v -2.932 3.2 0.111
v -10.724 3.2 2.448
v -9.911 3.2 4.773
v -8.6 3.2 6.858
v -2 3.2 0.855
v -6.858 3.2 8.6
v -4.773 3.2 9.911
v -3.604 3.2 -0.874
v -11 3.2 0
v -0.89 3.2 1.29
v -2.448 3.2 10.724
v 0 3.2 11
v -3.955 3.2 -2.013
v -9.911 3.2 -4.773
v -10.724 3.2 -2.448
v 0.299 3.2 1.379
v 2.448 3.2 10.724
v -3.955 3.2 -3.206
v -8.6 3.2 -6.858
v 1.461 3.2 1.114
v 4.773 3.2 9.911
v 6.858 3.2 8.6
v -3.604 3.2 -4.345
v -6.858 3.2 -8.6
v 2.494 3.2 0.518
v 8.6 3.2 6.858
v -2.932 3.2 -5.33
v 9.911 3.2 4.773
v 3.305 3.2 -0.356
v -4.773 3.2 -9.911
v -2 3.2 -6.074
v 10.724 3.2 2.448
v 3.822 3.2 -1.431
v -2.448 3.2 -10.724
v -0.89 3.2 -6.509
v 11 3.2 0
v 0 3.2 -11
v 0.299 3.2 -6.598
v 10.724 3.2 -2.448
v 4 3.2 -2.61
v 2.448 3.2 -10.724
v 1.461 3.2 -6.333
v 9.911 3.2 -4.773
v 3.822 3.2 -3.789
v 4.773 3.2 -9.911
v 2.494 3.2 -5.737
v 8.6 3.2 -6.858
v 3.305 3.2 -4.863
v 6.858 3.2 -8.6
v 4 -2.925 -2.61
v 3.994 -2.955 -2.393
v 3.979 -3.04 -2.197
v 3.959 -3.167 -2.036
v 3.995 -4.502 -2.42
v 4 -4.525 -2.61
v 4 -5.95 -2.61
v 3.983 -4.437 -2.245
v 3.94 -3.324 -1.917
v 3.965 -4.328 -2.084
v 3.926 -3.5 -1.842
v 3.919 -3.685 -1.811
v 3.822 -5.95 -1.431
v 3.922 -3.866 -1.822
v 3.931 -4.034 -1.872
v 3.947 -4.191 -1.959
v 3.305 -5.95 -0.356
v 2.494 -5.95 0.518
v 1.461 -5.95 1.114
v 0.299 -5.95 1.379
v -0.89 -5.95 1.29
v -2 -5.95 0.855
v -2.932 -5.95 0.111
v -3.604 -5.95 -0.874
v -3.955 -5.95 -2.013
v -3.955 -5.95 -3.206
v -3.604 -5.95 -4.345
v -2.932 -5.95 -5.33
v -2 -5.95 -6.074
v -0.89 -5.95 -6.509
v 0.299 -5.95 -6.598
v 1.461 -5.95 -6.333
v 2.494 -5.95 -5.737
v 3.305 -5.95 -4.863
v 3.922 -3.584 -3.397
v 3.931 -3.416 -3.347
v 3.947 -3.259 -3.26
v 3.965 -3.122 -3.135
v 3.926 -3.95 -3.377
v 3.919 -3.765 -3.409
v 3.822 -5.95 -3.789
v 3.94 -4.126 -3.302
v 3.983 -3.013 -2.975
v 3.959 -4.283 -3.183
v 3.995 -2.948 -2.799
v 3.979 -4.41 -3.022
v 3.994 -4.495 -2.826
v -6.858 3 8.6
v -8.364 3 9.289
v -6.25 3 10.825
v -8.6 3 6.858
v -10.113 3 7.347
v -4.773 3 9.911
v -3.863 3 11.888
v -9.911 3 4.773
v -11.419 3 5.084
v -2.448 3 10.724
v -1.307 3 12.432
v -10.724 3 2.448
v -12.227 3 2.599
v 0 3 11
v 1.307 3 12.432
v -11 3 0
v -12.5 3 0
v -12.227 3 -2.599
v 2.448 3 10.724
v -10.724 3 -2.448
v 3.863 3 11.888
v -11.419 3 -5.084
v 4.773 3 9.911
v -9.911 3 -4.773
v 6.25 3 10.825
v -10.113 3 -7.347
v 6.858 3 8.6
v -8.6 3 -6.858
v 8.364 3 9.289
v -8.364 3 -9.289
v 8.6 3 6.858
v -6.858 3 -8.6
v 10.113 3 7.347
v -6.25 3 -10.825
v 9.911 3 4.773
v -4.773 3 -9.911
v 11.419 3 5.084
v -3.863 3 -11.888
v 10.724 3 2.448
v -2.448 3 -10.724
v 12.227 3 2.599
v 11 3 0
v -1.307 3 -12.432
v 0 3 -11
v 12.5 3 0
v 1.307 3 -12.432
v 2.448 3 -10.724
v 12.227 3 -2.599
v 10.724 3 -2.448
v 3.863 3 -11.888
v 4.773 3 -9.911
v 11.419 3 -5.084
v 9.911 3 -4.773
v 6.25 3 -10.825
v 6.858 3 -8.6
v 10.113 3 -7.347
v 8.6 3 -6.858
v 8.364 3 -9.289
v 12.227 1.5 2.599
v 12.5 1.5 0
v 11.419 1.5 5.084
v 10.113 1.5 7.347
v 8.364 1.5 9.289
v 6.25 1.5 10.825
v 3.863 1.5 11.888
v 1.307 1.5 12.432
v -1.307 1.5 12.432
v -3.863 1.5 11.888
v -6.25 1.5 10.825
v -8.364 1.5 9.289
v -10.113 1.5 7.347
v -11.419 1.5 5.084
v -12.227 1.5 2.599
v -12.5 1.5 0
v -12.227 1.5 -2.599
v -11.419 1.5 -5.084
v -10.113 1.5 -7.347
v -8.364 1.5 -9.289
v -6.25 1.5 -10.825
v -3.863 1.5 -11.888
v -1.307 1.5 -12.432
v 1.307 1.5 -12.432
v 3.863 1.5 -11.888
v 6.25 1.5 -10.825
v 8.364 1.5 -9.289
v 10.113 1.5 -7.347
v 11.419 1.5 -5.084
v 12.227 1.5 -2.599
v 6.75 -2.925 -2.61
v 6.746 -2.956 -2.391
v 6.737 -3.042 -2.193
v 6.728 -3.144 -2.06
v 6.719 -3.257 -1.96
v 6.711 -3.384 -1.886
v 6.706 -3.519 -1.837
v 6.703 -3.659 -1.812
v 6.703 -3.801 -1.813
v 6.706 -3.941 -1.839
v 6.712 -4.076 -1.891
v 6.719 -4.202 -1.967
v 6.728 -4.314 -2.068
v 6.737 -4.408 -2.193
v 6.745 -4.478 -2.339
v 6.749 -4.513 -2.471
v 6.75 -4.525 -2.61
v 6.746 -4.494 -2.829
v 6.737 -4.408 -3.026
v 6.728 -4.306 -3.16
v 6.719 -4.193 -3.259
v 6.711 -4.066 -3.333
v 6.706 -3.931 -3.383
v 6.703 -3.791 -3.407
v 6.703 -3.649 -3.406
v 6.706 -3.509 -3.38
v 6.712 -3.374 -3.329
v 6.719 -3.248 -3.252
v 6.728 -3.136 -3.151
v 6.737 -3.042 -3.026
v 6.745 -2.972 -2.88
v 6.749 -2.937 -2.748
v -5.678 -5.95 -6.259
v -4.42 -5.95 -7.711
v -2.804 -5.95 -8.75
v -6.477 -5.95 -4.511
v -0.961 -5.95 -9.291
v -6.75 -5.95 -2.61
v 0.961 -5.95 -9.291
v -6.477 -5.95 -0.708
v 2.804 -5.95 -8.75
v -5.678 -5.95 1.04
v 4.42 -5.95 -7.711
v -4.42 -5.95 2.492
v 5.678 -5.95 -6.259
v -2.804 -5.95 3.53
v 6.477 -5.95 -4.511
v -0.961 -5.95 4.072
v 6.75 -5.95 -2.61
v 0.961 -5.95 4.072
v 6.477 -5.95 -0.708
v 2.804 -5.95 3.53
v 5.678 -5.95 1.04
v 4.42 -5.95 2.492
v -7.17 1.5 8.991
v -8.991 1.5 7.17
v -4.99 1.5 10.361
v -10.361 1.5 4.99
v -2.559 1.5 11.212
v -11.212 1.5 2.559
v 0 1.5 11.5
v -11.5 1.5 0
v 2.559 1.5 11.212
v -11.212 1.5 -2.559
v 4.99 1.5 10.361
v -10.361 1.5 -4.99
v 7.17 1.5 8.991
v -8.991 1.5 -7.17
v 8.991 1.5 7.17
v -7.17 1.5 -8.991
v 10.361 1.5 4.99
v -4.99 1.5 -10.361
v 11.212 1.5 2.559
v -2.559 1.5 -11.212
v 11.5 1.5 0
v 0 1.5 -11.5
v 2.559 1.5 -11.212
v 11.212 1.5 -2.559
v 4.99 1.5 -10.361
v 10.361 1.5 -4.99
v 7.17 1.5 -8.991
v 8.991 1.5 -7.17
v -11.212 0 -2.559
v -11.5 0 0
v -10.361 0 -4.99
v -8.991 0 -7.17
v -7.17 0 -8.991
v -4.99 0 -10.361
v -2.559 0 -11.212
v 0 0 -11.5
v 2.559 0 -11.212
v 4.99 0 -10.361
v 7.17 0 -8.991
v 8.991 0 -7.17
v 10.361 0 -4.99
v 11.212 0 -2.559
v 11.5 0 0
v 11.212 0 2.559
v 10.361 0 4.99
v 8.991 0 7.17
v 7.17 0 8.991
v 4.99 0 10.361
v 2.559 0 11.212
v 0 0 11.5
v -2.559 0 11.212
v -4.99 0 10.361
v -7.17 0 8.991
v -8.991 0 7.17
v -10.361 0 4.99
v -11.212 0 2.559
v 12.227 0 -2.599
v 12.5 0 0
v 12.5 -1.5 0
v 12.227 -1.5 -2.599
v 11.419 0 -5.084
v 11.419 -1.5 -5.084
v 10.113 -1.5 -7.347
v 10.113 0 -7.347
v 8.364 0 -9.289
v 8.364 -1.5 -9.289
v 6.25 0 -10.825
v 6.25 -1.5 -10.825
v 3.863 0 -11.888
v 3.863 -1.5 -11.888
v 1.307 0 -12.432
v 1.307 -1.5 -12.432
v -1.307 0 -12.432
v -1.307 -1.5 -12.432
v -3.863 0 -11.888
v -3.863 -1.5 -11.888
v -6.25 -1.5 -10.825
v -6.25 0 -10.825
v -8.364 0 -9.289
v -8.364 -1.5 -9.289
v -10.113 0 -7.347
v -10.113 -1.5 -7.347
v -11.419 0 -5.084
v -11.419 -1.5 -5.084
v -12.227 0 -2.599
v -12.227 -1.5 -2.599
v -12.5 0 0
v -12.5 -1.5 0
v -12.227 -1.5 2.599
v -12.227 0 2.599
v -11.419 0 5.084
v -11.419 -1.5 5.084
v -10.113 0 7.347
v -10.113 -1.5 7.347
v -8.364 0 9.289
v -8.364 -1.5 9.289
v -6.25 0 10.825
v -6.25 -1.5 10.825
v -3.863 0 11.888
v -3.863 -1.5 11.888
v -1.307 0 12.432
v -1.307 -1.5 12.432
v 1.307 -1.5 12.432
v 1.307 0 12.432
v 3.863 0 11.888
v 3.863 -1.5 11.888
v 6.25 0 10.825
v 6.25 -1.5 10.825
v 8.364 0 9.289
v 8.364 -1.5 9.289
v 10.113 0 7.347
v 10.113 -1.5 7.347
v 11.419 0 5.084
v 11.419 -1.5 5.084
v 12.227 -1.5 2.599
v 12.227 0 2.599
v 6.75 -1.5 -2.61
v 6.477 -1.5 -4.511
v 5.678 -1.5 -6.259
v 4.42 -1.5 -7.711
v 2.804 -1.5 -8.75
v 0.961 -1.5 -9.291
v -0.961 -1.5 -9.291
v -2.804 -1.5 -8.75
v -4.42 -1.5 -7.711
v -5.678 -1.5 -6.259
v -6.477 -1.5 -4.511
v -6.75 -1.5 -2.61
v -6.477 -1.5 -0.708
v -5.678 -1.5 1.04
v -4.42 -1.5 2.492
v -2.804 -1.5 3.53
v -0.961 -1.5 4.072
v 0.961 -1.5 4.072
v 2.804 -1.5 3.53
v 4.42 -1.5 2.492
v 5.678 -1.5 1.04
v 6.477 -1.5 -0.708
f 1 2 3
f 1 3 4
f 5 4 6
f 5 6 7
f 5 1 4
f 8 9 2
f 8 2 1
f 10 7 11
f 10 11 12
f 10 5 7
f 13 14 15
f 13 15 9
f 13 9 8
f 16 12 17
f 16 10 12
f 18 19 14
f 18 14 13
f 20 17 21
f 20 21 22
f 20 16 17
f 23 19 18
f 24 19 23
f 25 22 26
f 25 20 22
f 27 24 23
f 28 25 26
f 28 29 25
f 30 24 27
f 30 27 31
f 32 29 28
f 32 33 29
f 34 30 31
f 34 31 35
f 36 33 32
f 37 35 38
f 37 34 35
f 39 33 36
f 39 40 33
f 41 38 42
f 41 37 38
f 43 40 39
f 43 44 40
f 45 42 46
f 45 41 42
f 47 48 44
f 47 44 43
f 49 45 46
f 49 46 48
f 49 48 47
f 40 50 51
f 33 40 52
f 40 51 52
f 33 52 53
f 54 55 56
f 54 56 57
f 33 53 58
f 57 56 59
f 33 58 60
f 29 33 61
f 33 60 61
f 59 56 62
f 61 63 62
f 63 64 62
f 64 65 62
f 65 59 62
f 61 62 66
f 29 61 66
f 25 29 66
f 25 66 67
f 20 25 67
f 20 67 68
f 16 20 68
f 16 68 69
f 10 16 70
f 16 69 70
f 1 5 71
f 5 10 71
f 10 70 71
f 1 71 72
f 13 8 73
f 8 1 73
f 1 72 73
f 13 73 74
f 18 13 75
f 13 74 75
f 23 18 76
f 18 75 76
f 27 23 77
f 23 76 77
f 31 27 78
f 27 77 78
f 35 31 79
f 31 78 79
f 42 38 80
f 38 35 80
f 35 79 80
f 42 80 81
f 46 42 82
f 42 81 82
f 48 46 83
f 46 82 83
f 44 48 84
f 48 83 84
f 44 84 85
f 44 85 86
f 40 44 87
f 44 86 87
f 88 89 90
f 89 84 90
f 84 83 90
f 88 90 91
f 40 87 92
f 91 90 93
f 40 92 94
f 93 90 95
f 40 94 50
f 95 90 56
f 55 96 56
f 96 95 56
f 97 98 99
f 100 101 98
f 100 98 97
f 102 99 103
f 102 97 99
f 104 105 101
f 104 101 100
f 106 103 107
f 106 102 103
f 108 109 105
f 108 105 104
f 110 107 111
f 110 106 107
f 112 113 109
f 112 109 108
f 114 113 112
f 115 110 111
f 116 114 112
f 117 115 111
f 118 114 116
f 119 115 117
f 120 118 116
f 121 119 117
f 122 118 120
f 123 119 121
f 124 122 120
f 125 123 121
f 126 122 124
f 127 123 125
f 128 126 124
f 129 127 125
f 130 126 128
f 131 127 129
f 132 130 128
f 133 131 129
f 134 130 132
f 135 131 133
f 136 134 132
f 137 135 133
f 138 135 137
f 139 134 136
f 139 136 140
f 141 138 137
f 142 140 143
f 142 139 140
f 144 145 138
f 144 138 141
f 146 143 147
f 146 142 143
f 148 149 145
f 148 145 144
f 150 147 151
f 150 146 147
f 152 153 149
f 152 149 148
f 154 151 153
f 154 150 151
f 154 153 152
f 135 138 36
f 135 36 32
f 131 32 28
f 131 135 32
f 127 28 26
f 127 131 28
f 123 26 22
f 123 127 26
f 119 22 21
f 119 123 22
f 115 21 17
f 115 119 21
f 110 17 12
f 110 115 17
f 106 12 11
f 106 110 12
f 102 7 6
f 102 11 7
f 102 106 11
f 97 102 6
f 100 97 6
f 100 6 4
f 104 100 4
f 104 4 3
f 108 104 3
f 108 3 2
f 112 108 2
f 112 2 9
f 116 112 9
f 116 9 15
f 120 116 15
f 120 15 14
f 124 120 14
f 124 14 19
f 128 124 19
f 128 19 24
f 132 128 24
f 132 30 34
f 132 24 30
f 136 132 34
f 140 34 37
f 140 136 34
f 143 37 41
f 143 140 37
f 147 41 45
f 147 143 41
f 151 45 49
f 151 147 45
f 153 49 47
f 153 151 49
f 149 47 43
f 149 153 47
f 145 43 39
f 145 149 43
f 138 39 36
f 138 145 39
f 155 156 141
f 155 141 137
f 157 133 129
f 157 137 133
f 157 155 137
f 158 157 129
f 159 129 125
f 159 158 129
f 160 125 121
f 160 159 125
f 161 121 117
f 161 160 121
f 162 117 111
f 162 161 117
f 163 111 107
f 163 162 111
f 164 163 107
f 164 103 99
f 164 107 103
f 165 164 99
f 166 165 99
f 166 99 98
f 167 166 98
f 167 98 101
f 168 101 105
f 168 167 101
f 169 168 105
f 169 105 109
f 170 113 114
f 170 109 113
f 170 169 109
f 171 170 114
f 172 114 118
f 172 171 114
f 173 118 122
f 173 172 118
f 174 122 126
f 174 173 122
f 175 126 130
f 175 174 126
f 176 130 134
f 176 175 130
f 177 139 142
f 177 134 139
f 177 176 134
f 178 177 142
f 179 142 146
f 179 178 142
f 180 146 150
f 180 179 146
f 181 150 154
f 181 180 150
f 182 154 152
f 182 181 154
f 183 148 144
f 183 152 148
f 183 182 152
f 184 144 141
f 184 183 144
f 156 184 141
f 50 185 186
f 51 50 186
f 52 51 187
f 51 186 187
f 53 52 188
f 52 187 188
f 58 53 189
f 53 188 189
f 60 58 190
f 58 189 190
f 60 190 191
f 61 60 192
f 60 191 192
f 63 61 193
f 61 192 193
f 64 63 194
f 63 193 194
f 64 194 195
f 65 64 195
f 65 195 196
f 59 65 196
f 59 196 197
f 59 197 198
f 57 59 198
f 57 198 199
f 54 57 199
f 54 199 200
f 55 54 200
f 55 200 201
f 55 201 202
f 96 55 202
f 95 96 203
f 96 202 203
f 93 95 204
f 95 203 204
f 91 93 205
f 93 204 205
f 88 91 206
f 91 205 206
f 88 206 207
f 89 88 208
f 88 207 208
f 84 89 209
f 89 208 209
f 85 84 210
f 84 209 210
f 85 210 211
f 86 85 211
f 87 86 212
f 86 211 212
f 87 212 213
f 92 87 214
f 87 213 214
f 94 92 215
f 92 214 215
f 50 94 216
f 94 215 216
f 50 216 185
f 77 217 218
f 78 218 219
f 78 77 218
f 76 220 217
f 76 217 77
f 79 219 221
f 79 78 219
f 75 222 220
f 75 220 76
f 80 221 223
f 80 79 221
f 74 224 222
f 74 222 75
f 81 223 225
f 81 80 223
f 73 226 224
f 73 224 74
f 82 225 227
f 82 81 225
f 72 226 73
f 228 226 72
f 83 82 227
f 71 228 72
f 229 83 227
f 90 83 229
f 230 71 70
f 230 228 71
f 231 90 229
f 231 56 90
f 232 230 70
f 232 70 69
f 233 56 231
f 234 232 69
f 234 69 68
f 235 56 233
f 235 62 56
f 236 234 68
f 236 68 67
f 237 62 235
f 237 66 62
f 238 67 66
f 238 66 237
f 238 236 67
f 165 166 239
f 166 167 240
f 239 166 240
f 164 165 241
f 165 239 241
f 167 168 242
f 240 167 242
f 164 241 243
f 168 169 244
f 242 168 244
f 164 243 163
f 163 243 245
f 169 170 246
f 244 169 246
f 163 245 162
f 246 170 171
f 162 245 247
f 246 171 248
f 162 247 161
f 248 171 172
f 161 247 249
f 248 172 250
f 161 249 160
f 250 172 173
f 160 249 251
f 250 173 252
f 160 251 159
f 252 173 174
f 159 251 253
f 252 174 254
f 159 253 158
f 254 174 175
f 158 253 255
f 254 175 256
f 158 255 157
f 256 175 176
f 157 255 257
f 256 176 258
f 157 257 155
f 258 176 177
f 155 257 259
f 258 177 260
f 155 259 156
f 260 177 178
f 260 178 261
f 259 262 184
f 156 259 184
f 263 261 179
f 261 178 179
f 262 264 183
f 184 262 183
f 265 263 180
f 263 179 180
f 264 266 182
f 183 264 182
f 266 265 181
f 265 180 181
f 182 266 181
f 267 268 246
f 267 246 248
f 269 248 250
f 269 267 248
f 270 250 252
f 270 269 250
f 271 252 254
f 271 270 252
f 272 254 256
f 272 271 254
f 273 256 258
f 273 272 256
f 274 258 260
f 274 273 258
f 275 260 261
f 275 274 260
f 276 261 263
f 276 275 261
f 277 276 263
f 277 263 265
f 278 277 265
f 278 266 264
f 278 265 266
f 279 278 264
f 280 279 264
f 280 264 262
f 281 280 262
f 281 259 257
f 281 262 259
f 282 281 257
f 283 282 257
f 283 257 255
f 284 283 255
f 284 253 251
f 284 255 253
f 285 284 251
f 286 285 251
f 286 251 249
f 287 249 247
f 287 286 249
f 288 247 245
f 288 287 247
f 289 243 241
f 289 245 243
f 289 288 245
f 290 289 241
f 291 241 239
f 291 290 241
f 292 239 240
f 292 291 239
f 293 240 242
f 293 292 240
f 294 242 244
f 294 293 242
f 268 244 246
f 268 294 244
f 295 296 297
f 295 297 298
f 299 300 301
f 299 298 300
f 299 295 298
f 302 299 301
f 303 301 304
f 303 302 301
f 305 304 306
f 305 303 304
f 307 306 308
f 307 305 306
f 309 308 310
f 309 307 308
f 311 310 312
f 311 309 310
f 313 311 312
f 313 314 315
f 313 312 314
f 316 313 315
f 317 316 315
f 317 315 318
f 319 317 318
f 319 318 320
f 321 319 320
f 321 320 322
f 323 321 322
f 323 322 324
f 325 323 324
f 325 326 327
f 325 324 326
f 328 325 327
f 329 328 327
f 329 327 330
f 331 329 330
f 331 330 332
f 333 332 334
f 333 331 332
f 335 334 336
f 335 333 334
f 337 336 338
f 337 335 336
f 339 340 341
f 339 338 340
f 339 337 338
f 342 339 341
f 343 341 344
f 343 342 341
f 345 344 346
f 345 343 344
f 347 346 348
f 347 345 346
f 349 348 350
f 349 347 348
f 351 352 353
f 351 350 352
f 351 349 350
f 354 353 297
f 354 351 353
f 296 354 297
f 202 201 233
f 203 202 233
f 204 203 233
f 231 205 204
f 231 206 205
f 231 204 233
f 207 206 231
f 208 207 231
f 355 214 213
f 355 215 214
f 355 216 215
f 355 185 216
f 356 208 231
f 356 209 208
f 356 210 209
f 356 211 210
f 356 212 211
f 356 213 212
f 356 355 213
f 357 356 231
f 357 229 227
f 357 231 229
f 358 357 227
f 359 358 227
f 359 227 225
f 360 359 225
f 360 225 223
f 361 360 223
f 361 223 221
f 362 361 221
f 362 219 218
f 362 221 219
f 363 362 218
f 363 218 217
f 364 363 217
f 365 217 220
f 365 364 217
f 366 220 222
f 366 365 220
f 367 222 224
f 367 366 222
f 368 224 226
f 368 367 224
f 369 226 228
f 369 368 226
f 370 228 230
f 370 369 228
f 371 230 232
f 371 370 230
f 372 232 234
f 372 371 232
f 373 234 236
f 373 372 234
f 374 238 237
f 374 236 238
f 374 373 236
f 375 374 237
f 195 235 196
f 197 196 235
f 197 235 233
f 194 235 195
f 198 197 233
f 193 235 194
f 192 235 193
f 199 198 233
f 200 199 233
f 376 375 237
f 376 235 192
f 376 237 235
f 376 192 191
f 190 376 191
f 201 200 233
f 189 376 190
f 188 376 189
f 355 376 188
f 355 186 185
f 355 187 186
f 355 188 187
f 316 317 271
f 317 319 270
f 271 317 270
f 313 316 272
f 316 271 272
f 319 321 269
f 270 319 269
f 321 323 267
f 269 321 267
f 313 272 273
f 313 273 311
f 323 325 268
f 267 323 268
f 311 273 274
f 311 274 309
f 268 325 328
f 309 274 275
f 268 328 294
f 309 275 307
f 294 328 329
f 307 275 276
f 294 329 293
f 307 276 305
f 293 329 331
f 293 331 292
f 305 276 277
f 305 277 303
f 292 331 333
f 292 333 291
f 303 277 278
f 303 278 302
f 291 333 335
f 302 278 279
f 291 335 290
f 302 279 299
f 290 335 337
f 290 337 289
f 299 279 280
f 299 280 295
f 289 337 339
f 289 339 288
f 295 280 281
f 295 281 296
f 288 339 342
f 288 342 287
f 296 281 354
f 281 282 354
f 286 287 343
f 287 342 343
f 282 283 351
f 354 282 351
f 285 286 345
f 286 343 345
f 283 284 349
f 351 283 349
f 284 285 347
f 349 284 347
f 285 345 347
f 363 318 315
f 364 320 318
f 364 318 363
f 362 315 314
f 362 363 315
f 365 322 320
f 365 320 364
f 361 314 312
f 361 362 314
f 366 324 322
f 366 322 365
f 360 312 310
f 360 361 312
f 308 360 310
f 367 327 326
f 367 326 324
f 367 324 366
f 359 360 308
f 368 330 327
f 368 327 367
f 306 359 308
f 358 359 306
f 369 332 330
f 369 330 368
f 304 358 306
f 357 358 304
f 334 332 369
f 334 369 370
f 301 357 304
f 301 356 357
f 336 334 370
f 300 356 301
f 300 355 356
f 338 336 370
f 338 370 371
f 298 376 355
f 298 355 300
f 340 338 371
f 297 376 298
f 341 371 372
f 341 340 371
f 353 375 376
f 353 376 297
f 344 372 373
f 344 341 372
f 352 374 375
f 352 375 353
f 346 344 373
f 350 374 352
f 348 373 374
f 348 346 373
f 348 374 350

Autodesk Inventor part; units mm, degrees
ref_plane "XZ Plane" through (0, 0, 0) normal (0, 1, 0) x (-1, 0, 0)
ref_plane "XY Plane" through (0, 0, 0) normal (0, 0, 1) x (1, 0, 0)
sketch "Sketch1" plane through (0, 0, 0) normal (0, 1, 0) x (-1, 0, 0)
  circle A0 centre (0, 0) radius 11.5
  dimension "d0" = 23
extrude "Extrusion1" add sketch "Sketch1" along normal blind 1.5
sketch "Sketch2" plane through (0, 1.5, 0) normal (0, 1, 0) x (1, 0, 0)
  circle A0 centre (0, 0) radius 12.5
  dimension "d3" = 25
extrude "Extrusion2" add sketch "Sketch2" along normal blind 1.5
sketch "Sketch3" plane through (0, 0, 0) normal (0, -1, 0) x (1, 0, 0)
  circle A0 centre (0, 0) radius 12.5
  dimension "d6" = 25
extrude "Extrusion3" add sketch "Sketch3" along normal blind 1.5
sketch "Sketch4" plane through (0, -1.5, 0) normal (0, -1, 0) x (1, 0, 0)
  circle A0 centre (0, 0) radius 12.5 projected
  line L0 (0, -12.5) -> (0, -9.5) construction
  circle A1 centre (0, -2.6096) radius 6.75
  circle A2 centre (0, -2.6096) radius 4
  dimension "d9" = 3
  dimension "d17" = 13.5
  dimension "d18" = 8
extrude "Extrusion6" add sketch "Sketch4" along normal blind 4.45 contours A1
extrude "Extrusion7" cut sketch "Sketch4" against normal blind 10 contours A2
ref_plane "Work Plane1" through (6.76, 0, 0) normal (1, 0, 0) x (0, 1, 0)
sketch "Sketch6" plane through (6.76, 0, 0) normal (1, 0, 0) x (0, 1, 0)
  line L0 (-5.95, 4.1404) -> (-5.95, -9.3596) projected
  line L1 (-1.5, -9.3596) -> (-1.5, 4.1404) projected
  line L2 (-5.95, -9.3596) -> (-5.95, 4.1404) construction
  line L3 (-1.5, -9.3596) -> (-5.95, -9.3596) construction
  line L4 (-5.95, 4.1404) -> (-1.5, 4.1404) construction
  line L5 (-1.5, 4.1404) -> (-5.95, 4.1404) construction
  line L6 (-5.95, -9.3596) -> (-5.95, -2.6096) construction
  line L7 (-5.95, 4.1404) -> (-3.725, 4.1404) construction
  line L8 (-3.725, 3.1248) -> (-3.725, -6.8752) construction
  circle A0 centre (-3.725, -2.6096) radius 0.8
  point P0 (0, 0)
  dimension "d24" = 4.45
  dimension "d25" = 13.5
  dimension "d26" = 6.75
  dimension "d27" = 2.225
  dimension "d28" = 10
  dimension "d29" = 1.6
extrude "Extrusion8" cut sketch "Sketch6" against normal blind 4.45
sketch "Sketch7" plane through (0, 3, 0) normal (0, 1, 0) x (1, 0, 0)
  circle A0 centre (0, 0) radius 11
  circle A1 centre (0, 2.6096) radius 4 projected
  circle A2 centre (0, 2.6096) radius 4
  dimension "d32" = 22
extrude "Extrusion10" add sketch "Sketch7" along normal blind 0.2
properties part number "reverse gear eccentric 1"
